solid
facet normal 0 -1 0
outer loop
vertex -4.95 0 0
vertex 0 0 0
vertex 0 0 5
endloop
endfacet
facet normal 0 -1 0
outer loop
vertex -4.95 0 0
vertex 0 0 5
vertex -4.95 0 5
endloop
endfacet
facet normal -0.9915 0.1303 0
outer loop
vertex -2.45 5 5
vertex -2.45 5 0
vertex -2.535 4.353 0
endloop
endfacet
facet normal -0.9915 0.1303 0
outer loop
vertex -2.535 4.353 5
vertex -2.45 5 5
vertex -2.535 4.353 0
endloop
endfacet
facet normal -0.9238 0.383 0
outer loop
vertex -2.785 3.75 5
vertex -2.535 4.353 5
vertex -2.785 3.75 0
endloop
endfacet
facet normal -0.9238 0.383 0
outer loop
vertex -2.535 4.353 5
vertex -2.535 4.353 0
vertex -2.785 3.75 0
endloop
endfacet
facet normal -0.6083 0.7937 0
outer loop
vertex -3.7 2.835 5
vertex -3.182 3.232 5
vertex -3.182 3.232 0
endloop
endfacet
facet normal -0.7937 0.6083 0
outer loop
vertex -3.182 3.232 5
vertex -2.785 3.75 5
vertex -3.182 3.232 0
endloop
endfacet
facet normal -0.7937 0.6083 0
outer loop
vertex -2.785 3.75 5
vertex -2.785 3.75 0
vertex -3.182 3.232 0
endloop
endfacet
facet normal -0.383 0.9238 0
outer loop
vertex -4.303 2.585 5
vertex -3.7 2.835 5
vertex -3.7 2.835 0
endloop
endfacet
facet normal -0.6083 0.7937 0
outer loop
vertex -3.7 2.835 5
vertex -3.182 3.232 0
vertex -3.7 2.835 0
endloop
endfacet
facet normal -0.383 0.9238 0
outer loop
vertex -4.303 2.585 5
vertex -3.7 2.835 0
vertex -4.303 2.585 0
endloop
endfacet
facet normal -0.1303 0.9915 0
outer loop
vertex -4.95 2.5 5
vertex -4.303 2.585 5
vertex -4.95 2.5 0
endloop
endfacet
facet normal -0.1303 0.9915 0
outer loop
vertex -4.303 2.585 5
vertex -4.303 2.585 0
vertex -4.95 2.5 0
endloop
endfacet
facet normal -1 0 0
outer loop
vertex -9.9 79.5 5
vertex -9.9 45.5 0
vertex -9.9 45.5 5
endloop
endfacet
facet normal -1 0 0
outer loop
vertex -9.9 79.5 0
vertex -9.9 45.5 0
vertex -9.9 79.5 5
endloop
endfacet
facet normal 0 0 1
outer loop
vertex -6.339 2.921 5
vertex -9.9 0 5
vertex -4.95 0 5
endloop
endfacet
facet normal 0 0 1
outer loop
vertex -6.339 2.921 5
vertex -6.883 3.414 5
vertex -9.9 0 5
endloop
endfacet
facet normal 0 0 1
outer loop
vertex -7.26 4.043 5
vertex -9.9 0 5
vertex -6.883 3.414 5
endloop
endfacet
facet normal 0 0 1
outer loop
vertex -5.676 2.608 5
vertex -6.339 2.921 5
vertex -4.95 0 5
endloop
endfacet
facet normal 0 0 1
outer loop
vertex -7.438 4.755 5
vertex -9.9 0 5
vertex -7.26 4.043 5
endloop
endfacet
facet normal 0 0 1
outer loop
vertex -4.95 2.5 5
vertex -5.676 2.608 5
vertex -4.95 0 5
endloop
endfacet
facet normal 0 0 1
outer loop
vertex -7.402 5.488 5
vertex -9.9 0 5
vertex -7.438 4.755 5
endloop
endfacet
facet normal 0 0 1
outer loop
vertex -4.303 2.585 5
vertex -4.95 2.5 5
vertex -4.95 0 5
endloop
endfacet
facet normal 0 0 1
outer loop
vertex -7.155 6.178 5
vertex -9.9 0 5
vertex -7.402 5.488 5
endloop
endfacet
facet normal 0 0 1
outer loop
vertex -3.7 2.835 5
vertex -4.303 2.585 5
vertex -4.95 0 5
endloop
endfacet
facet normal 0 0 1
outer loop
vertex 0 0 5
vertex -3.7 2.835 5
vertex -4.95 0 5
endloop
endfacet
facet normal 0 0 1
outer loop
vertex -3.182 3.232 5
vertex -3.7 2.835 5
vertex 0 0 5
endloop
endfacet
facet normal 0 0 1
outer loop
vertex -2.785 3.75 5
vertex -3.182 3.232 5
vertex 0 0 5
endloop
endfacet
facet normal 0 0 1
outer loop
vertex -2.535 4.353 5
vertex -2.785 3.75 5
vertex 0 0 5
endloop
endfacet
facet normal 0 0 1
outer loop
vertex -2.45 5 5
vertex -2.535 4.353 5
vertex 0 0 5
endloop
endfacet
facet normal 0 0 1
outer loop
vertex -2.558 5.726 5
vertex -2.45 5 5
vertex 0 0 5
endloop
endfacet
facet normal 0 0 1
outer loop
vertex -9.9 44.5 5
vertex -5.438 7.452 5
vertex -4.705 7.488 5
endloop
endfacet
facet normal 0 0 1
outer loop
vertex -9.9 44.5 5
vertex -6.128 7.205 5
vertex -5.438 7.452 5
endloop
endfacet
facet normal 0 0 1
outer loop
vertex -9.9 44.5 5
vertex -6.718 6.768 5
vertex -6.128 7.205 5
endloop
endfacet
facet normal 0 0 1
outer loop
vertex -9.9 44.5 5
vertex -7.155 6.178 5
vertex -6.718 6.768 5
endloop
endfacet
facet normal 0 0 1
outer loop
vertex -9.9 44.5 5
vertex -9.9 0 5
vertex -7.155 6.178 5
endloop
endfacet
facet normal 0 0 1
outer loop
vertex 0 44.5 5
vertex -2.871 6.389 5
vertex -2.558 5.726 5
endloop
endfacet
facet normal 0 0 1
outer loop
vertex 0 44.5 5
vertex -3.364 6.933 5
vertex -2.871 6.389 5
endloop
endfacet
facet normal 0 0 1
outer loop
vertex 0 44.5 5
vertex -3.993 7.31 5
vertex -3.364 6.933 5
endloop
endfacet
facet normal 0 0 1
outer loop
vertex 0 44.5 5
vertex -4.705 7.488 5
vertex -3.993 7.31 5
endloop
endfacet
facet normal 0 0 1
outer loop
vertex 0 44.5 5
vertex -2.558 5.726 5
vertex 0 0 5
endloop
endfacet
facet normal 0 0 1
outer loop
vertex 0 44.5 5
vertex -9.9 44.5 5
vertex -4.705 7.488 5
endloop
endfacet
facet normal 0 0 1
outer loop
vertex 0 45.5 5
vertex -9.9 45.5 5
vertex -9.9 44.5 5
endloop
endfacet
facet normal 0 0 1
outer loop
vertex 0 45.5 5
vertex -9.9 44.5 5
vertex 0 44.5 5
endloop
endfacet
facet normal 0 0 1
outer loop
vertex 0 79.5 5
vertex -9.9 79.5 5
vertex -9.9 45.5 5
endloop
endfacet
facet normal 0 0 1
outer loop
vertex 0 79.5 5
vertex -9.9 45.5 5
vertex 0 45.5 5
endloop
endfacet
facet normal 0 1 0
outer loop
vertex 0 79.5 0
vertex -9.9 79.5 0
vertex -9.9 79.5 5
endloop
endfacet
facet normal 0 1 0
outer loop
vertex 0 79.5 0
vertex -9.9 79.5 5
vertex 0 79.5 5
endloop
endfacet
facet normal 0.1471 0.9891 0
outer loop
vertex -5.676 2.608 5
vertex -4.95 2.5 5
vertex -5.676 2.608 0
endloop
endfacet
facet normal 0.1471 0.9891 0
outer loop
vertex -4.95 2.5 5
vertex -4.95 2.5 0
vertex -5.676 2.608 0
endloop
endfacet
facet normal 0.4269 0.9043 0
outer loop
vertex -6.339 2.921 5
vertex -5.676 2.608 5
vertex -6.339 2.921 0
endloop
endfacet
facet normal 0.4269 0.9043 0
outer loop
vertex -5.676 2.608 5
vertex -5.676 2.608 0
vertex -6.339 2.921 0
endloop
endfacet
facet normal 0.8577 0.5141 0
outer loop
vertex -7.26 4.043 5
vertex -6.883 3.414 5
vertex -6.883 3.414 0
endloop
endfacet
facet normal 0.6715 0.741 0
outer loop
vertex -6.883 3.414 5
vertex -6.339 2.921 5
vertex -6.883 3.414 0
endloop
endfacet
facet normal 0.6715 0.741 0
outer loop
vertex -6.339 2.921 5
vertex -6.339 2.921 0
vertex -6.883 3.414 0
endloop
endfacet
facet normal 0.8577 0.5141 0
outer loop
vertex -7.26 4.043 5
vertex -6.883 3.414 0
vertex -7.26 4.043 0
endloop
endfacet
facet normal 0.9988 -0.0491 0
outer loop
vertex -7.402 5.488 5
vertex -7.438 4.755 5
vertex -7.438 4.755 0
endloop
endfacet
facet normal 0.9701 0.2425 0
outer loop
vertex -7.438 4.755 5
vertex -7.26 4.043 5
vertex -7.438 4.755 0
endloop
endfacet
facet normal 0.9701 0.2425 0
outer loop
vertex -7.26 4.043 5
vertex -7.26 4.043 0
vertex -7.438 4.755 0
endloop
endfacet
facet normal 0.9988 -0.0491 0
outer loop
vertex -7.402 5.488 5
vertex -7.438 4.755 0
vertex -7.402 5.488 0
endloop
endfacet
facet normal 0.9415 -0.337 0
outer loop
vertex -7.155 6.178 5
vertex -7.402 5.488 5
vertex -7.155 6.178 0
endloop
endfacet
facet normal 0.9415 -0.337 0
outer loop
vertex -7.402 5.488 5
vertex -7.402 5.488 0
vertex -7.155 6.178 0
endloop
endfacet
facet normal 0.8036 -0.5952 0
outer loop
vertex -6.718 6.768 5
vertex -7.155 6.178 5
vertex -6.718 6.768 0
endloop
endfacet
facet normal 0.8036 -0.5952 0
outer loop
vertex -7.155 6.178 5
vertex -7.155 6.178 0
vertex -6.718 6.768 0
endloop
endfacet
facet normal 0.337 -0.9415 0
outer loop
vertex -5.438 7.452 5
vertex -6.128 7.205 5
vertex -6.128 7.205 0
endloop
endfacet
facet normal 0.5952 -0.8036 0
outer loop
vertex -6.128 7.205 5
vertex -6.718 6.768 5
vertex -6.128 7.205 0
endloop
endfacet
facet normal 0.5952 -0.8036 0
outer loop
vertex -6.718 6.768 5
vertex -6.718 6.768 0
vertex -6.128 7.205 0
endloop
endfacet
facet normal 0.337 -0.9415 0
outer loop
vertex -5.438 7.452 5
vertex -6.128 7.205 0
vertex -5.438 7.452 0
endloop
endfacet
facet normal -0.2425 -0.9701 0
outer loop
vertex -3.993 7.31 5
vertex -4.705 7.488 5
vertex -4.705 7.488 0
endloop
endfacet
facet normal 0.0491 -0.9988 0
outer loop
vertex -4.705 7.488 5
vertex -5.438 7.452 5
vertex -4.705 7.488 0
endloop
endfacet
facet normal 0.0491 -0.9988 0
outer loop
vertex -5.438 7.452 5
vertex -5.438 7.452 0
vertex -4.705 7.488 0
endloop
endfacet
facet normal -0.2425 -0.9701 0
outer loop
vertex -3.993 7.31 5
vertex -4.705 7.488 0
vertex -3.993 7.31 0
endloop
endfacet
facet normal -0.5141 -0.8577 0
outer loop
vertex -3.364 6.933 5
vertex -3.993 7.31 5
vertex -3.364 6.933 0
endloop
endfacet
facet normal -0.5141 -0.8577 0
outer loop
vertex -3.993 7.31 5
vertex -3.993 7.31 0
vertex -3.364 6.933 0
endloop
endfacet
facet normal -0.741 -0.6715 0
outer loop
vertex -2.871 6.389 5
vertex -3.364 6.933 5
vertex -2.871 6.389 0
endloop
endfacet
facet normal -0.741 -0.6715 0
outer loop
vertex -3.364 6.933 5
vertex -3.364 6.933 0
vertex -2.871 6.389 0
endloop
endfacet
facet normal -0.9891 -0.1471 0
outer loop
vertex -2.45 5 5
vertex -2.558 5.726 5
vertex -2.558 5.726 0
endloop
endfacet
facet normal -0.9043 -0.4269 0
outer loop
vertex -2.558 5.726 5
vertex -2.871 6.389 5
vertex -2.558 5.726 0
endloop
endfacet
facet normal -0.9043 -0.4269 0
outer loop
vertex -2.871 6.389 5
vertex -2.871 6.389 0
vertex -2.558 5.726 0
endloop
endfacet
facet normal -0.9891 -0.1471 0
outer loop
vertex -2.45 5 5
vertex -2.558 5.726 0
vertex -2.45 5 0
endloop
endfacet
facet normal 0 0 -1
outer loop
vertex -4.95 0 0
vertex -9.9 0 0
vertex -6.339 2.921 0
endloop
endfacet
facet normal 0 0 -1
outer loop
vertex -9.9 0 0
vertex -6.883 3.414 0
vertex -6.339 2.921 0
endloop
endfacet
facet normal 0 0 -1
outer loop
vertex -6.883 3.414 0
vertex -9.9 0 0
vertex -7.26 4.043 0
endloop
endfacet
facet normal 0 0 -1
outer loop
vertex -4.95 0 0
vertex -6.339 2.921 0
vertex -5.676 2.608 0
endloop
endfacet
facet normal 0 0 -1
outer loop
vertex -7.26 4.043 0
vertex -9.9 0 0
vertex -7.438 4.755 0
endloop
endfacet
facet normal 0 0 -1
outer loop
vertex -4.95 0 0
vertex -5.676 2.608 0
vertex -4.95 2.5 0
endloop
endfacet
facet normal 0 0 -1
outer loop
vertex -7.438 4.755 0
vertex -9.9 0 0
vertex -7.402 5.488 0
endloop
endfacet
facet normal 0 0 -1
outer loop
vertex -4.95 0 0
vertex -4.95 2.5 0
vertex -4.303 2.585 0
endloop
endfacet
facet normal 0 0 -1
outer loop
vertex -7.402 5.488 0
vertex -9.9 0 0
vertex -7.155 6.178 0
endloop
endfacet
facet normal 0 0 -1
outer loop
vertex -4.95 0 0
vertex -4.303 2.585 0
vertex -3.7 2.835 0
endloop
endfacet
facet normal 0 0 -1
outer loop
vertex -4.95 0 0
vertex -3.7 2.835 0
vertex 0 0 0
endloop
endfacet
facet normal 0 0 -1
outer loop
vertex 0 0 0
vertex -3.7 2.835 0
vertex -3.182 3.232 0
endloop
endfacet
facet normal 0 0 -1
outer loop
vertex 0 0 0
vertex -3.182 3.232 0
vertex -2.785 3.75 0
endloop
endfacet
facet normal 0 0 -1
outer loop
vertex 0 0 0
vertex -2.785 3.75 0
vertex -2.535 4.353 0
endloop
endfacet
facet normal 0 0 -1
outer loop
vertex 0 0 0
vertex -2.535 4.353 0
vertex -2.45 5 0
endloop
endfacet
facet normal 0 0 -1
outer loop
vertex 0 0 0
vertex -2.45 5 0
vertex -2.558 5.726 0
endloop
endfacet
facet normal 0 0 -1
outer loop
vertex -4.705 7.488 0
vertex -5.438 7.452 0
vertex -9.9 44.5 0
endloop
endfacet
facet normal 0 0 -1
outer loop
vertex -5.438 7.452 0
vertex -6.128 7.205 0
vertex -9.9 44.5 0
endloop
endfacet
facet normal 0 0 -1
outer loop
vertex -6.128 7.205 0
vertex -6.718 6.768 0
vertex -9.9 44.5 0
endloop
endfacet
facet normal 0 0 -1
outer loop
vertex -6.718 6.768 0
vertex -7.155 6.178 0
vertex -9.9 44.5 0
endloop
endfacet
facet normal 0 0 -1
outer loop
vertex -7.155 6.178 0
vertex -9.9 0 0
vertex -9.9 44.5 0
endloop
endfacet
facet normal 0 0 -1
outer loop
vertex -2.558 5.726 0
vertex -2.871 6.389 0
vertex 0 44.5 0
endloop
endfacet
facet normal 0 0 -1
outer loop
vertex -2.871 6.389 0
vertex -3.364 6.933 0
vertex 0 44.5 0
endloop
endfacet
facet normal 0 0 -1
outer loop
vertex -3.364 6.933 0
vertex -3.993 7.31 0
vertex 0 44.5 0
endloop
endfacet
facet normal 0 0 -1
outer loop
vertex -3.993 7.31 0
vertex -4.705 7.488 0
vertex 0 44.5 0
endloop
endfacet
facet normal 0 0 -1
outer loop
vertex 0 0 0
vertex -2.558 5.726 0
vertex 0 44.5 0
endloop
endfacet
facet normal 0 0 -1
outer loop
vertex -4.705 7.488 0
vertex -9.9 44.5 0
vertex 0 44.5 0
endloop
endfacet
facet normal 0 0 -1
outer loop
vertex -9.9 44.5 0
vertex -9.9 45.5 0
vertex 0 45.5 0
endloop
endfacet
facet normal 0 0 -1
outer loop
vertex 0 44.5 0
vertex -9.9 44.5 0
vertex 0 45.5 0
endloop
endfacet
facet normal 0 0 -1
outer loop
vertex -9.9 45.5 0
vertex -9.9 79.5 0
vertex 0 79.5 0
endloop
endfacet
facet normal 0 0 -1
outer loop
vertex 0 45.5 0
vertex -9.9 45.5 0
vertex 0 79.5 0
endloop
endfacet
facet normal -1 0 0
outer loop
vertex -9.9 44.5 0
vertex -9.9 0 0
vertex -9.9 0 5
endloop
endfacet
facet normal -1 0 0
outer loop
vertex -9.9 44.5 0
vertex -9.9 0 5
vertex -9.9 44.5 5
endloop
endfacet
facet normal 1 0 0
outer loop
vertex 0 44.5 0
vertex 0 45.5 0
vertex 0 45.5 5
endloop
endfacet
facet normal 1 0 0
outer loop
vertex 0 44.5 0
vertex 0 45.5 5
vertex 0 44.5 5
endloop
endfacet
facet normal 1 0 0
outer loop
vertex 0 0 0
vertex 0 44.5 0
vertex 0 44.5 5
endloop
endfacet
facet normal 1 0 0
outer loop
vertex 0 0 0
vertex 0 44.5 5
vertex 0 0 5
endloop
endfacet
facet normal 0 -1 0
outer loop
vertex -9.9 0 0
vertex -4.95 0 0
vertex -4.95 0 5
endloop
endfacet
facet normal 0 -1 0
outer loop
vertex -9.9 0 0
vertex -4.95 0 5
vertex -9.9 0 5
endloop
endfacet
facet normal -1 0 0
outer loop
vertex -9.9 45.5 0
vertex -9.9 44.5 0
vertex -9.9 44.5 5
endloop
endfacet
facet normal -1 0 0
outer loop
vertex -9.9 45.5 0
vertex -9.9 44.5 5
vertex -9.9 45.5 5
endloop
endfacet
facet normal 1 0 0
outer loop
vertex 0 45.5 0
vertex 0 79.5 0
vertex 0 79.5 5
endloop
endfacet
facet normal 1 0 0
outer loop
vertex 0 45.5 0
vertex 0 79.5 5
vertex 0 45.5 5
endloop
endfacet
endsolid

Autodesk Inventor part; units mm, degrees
ref_plane "YZ Plane" through (0, 0, 0) normal (1, 0, 0) x (0, 1, 0)
ref_plane "XZ Plane" through (0, 0, 0) normal (0, 1, 0) x (-1, 0, 0)
ref_plane "XY Plane" through (0, 0, 0) normal (0, 0, 1) x (1, 0, 0)
sketch "Sketch2" plane through (0, 0, 0) normal (0, 0, 1) x (1, 0, 0)
  line L0 (0, 0) -> (-9.9, 0)
  line L1 (-9.9, 0) -> (-9.9, 105)
  line L2 (-9.9, 105) -> (0, 105)
  line L3 (0, 105) -> (0, 0)
  line L4 (-4.95, 0) -> (-4.95, 2.5)
  line L5 (-4.95, 0) -> (-2.45, 0) construction
  circle A0 centre (-4.95, 5) radius 2.5
  line L6 (-4.95, 7.5) -> (32.05, 7.5) construction
  line L7 (0, 44.5) -> (0, 0)
  line L8 (0, 0) -> (-9.9, 0)
  line L9 (-9.9, 0) -> (-9.9, 44.5)
  line L10 (0, 45.5) -> (0, 0)
  line L11 (0, 0) -> (-9.9, 0)
  line L12 (-9.9, 0) -> (-9.9, 45.5)
  line L13 (-4.95, 7.5) -> (66.05, 7.5) construction
  line L14 (-4.95, 7.5) -> (67.05, 7.5) construction
  line L15 (-9.9, 79.5) -> (0, 79.5)
  dimension "d35" = 5
  dimension "d4" = 9.9
  dimension "d5" = 105
  dimension "d33" = 2.5
  dimension "d34" = 90
extrude "Extrusion6" add sketch "Sketch2" along normal blind 5 contours L0 L1 L15 L3
properties part number "Cube_Holder_SB_V1_(71mm)"
